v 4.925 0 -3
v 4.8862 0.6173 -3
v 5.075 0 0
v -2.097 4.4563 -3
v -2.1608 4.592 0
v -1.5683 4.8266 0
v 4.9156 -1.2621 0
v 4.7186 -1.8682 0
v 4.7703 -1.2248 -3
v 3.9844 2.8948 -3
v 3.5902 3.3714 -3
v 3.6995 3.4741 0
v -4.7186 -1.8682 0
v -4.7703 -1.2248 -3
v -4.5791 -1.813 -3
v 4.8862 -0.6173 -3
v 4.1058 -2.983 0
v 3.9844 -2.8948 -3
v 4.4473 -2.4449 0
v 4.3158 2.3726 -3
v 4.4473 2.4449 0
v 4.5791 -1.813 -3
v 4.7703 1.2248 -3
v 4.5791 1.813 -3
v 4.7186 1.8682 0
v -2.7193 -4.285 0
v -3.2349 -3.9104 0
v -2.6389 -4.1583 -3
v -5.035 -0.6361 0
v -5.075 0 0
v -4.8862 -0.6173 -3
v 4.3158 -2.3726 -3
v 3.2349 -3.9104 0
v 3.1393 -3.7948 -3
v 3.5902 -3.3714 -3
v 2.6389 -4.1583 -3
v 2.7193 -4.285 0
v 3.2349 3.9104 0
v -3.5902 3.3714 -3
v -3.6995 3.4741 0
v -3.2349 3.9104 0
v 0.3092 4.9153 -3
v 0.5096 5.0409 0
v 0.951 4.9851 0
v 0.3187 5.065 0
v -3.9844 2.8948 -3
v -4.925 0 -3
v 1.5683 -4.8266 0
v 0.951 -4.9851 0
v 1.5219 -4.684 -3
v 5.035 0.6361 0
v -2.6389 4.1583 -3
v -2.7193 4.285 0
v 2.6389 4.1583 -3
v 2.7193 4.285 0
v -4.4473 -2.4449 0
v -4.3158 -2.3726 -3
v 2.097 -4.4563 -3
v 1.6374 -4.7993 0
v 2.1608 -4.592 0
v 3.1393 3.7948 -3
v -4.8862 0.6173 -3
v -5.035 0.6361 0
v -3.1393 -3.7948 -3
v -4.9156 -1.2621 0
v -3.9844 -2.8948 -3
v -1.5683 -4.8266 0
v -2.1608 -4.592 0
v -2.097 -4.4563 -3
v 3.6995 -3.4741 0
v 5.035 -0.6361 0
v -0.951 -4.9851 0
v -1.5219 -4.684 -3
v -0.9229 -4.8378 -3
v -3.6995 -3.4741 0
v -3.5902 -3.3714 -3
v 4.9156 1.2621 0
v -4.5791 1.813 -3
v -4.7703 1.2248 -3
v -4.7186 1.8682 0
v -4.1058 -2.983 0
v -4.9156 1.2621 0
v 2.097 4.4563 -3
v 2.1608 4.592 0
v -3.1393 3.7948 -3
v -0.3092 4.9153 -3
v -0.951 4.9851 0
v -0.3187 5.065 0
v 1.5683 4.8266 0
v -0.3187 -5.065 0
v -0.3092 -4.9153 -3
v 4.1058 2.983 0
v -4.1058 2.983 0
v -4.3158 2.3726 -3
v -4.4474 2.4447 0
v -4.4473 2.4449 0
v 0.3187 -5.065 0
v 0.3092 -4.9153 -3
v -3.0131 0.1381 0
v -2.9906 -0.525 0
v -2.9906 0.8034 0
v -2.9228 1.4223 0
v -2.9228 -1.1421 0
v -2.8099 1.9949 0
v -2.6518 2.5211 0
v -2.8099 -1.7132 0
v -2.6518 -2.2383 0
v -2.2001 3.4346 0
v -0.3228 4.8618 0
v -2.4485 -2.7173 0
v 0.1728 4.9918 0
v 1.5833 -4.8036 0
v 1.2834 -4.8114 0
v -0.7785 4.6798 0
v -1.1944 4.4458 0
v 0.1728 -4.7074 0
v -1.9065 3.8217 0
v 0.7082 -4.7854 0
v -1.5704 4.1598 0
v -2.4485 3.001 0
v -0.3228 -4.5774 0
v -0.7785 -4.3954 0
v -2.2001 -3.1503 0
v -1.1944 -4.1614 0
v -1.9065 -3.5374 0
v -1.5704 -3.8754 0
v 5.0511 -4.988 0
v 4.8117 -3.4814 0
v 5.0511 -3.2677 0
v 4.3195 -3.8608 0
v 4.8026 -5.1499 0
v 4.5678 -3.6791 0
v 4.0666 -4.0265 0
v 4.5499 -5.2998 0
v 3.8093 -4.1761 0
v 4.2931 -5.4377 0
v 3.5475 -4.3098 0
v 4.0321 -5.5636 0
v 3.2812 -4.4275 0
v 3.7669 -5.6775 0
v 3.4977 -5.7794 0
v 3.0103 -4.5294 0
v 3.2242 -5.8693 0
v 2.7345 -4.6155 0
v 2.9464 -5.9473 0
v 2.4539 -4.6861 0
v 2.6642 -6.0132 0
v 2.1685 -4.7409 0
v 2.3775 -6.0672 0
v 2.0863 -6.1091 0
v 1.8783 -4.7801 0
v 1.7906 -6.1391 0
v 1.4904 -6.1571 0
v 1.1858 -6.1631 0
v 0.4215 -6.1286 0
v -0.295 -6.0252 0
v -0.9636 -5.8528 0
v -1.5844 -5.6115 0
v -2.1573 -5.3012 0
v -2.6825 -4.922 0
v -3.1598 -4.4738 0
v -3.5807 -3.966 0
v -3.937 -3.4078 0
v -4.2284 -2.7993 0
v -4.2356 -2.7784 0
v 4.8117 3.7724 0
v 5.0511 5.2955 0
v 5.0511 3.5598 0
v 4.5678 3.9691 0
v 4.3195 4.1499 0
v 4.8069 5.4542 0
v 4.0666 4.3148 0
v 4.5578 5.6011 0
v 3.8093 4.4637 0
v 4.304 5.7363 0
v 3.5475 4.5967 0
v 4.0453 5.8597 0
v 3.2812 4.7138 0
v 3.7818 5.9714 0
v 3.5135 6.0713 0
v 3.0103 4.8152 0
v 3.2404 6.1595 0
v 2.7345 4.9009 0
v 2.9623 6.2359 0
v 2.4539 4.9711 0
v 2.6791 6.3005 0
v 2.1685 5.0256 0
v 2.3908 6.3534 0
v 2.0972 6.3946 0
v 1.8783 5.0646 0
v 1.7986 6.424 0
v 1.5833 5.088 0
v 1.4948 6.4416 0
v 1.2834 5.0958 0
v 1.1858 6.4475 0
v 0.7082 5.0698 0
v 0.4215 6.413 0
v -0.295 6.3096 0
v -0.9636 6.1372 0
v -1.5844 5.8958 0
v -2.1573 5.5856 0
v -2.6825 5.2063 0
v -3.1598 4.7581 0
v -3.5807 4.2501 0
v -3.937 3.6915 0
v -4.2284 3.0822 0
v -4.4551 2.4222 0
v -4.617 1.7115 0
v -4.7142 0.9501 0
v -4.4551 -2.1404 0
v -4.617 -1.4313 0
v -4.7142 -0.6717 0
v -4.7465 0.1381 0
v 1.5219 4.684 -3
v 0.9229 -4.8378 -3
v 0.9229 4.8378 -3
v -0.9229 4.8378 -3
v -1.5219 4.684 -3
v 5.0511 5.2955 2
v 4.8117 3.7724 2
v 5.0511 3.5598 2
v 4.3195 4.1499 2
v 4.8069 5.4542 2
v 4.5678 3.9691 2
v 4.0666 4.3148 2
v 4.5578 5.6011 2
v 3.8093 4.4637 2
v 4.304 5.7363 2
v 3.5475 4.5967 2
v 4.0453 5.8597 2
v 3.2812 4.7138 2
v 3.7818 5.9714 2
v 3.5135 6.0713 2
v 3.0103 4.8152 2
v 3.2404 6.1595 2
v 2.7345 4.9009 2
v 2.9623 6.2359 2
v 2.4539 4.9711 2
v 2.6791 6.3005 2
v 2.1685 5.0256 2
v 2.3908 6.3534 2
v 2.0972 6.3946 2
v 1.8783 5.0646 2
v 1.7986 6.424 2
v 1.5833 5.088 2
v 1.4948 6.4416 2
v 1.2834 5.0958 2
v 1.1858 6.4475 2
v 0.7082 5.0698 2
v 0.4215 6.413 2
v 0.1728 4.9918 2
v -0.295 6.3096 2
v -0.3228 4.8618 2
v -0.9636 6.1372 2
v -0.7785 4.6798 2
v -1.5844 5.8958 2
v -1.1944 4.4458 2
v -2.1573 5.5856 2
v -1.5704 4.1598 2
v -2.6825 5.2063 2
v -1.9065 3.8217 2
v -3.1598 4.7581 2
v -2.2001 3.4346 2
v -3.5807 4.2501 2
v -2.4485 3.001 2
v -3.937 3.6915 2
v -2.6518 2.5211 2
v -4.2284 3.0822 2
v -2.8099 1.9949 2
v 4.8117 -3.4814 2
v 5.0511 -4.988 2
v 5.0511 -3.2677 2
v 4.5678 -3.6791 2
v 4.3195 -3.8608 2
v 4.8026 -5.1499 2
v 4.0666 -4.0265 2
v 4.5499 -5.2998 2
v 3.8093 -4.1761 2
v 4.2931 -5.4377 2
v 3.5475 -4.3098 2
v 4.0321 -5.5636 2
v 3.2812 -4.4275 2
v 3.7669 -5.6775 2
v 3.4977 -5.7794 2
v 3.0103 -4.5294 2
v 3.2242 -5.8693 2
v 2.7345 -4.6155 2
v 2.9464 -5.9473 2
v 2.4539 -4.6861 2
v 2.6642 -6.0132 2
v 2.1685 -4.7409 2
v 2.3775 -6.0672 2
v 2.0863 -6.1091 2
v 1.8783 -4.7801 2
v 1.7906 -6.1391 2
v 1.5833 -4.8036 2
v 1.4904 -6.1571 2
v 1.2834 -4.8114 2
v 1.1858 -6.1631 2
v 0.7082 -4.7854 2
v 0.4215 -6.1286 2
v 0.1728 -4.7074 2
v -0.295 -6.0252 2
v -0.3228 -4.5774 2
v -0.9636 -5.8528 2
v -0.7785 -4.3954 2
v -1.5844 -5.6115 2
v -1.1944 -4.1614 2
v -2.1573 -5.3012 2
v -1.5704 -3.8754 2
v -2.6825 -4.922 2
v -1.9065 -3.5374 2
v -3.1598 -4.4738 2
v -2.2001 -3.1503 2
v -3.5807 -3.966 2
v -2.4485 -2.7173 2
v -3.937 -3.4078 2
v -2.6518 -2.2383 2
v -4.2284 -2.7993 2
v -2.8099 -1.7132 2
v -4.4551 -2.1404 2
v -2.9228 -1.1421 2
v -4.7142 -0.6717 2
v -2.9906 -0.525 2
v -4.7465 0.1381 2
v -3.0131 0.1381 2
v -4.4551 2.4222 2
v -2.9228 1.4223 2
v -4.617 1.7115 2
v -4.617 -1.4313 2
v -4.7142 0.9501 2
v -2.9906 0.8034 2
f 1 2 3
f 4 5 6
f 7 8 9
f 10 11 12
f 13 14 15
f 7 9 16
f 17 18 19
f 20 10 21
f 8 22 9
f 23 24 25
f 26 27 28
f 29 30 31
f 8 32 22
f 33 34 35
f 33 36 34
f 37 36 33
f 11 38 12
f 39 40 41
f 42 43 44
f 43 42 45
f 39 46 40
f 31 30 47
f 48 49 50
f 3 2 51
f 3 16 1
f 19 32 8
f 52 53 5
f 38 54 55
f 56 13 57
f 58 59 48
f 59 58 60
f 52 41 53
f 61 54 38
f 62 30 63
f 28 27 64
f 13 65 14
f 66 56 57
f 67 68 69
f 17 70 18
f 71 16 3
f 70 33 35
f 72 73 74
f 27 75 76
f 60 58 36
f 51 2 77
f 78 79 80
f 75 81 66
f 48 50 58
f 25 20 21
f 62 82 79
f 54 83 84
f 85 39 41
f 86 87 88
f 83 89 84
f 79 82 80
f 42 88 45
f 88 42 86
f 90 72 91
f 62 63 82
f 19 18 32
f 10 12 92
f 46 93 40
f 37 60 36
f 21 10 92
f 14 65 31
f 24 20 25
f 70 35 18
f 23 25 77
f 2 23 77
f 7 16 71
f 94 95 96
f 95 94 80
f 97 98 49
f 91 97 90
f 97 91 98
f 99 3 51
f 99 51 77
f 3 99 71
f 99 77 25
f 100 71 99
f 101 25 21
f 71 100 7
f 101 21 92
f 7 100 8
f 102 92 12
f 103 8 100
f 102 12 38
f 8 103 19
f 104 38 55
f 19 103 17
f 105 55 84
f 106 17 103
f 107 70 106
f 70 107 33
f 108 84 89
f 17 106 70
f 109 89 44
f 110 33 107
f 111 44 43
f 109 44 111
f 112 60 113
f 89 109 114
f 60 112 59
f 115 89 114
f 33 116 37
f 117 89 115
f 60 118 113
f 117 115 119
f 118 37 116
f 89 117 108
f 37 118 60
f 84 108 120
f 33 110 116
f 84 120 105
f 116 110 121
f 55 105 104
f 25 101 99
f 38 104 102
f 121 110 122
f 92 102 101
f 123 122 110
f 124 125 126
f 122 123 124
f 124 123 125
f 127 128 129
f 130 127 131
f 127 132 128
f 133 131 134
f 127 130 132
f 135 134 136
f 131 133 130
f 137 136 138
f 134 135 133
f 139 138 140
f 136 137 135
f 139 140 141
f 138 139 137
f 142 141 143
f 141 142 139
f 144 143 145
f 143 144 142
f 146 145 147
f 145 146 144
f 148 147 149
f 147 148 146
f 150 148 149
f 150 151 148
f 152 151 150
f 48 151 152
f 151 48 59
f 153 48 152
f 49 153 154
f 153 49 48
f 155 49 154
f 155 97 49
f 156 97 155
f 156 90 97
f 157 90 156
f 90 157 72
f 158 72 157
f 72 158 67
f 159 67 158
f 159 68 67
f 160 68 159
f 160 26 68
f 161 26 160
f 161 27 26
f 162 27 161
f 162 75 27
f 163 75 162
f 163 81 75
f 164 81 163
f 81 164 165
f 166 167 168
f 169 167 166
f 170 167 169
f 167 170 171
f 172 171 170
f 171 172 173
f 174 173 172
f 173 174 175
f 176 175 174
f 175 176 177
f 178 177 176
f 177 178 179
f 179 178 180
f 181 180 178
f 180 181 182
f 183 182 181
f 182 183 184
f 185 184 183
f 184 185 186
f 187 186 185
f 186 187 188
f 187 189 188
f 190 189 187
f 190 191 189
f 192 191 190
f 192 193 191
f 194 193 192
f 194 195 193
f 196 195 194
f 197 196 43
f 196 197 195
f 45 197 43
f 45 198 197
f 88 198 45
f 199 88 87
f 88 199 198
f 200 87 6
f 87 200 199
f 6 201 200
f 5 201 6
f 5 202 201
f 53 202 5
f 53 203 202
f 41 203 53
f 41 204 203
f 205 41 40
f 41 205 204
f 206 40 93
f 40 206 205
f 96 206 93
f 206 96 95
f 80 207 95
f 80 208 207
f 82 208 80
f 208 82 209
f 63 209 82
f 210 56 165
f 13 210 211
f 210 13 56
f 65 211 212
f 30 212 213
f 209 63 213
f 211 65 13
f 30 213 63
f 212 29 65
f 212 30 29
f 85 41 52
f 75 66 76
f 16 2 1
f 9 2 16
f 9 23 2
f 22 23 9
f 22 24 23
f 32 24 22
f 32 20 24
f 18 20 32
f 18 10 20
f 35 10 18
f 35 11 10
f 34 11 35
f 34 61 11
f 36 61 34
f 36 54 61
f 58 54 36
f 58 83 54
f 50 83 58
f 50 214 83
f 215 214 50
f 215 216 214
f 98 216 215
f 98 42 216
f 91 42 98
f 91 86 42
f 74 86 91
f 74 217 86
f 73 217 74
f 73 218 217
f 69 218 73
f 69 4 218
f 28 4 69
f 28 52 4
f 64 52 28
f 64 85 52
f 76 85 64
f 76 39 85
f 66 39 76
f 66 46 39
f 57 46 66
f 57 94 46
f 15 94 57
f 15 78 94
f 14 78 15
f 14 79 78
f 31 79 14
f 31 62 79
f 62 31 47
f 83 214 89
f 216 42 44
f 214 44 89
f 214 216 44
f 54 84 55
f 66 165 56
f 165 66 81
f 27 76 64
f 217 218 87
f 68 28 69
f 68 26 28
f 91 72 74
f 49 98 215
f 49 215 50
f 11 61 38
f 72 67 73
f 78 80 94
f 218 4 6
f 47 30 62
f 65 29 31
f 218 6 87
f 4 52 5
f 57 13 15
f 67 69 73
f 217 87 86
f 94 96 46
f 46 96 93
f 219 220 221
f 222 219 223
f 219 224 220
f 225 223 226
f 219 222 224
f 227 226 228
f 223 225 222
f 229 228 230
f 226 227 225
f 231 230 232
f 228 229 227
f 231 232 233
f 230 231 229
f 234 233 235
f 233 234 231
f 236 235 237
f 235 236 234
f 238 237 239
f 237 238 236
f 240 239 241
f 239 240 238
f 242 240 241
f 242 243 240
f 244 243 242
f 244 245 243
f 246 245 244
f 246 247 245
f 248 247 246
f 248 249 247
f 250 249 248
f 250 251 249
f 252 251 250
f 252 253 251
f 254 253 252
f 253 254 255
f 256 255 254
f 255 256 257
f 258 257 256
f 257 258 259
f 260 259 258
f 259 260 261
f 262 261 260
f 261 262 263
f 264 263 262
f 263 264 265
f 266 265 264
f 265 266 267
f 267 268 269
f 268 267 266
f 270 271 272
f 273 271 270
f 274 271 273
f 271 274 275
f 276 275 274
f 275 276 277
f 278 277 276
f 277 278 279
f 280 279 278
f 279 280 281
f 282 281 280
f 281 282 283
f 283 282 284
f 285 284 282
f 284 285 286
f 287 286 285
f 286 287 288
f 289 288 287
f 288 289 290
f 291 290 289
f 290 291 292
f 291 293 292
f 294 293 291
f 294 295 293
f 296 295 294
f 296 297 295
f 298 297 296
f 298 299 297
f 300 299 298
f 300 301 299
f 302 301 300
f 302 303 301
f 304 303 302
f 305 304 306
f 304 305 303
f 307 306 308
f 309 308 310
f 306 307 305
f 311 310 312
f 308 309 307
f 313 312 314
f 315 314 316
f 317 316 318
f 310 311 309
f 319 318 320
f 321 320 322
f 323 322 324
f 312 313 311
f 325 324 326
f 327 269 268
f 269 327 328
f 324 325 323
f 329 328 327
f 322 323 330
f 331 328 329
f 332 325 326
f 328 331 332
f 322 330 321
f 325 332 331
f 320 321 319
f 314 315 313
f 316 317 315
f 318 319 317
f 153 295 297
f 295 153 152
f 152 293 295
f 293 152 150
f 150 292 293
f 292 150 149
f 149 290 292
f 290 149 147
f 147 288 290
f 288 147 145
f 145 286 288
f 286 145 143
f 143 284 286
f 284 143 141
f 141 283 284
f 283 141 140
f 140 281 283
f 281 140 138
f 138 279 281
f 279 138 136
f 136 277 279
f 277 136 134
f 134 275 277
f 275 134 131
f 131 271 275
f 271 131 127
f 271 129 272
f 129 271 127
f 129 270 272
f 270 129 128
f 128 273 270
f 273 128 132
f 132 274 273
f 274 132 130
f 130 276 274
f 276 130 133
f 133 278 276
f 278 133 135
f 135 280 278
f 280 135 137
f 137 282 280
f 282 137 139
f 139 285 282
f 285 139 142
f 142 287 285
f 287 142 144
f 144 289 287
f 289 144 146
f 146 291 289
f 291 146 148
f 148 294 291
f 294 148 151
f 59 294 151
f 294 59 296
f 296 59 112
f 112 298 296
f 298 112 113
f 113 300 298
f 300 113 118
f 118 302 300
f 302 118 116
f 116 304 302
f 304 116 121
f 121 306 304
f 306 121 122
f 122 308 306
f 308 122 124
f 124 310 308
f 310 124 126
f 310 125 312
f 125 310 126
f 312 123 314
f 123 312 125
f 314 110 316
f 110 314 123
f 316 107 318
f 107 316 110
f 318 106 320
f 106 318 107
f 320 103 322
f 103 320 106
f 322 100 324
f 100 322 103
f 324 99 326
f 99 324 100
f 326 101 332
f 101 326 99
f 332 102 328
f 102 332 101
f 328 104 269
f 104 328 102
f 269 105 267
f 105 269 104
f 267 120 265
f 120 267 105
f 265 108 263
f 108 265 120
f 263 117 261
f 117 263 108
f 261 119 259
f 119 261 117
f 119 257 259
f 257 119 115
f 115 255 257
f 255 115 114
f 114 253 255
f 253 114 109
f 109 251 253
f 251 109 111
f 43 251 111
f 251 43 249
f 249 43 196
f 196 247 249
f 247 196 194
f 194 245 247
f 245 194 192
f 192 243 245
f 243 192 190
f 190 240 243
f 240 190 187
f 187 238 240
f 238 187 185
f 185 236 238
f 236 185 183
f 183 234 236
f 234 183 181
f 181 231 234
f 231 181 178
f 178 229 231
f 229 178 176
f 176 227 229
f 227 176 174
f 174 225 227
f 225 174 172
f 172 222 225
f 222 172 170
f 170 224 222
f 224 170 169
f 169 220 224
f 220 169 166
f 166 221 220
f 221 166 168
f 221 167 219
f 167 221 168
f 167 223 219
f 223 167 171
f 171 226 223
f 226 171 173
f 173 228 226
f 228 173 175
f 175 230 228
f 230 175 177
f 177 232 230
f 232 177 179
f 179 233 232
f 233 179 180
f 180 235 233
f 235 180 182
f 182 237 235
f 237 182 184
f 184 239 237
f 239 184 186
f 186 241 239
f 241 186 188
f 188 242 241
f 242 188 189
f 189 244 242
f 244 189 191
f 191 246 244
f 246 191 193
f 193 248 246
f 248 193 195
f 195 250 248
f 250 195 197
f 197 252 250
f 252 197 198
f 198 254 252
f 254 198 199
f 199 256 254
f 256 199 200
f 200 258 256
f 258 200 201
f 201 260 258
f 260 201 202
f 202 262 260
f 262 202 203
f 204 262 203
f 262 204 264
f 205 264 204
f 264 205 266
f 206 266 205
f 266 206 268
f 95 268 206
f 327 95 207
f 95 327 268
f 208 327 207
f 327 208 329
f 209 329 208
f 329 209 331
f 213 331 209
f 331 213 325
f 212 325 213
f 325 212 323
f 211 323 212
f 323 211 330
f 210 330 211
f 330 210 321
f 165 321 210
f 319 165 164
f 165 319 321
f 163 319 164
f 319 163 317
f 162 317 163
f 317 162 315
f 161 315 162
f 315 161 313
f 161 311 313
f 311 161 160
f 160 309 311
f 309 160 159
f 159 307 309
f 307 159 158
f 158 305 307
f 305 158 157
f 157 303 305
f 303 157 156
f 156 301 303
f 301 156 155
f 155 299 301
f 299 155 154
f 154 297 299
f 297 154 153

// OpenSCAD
$fn = 50;


difference() {
	union() {
		translate(v = [0, 0, -3.0000000000]) {
			cylinder(h = 3, r1 = 4.9250000000, r2 = 5.0750000000);
		}
		linear_extrude(height = 2) {
			text(font = "Impact", halign = "center", size = 12, text = "C", valign = "center");
		}
	}
	union();
}
